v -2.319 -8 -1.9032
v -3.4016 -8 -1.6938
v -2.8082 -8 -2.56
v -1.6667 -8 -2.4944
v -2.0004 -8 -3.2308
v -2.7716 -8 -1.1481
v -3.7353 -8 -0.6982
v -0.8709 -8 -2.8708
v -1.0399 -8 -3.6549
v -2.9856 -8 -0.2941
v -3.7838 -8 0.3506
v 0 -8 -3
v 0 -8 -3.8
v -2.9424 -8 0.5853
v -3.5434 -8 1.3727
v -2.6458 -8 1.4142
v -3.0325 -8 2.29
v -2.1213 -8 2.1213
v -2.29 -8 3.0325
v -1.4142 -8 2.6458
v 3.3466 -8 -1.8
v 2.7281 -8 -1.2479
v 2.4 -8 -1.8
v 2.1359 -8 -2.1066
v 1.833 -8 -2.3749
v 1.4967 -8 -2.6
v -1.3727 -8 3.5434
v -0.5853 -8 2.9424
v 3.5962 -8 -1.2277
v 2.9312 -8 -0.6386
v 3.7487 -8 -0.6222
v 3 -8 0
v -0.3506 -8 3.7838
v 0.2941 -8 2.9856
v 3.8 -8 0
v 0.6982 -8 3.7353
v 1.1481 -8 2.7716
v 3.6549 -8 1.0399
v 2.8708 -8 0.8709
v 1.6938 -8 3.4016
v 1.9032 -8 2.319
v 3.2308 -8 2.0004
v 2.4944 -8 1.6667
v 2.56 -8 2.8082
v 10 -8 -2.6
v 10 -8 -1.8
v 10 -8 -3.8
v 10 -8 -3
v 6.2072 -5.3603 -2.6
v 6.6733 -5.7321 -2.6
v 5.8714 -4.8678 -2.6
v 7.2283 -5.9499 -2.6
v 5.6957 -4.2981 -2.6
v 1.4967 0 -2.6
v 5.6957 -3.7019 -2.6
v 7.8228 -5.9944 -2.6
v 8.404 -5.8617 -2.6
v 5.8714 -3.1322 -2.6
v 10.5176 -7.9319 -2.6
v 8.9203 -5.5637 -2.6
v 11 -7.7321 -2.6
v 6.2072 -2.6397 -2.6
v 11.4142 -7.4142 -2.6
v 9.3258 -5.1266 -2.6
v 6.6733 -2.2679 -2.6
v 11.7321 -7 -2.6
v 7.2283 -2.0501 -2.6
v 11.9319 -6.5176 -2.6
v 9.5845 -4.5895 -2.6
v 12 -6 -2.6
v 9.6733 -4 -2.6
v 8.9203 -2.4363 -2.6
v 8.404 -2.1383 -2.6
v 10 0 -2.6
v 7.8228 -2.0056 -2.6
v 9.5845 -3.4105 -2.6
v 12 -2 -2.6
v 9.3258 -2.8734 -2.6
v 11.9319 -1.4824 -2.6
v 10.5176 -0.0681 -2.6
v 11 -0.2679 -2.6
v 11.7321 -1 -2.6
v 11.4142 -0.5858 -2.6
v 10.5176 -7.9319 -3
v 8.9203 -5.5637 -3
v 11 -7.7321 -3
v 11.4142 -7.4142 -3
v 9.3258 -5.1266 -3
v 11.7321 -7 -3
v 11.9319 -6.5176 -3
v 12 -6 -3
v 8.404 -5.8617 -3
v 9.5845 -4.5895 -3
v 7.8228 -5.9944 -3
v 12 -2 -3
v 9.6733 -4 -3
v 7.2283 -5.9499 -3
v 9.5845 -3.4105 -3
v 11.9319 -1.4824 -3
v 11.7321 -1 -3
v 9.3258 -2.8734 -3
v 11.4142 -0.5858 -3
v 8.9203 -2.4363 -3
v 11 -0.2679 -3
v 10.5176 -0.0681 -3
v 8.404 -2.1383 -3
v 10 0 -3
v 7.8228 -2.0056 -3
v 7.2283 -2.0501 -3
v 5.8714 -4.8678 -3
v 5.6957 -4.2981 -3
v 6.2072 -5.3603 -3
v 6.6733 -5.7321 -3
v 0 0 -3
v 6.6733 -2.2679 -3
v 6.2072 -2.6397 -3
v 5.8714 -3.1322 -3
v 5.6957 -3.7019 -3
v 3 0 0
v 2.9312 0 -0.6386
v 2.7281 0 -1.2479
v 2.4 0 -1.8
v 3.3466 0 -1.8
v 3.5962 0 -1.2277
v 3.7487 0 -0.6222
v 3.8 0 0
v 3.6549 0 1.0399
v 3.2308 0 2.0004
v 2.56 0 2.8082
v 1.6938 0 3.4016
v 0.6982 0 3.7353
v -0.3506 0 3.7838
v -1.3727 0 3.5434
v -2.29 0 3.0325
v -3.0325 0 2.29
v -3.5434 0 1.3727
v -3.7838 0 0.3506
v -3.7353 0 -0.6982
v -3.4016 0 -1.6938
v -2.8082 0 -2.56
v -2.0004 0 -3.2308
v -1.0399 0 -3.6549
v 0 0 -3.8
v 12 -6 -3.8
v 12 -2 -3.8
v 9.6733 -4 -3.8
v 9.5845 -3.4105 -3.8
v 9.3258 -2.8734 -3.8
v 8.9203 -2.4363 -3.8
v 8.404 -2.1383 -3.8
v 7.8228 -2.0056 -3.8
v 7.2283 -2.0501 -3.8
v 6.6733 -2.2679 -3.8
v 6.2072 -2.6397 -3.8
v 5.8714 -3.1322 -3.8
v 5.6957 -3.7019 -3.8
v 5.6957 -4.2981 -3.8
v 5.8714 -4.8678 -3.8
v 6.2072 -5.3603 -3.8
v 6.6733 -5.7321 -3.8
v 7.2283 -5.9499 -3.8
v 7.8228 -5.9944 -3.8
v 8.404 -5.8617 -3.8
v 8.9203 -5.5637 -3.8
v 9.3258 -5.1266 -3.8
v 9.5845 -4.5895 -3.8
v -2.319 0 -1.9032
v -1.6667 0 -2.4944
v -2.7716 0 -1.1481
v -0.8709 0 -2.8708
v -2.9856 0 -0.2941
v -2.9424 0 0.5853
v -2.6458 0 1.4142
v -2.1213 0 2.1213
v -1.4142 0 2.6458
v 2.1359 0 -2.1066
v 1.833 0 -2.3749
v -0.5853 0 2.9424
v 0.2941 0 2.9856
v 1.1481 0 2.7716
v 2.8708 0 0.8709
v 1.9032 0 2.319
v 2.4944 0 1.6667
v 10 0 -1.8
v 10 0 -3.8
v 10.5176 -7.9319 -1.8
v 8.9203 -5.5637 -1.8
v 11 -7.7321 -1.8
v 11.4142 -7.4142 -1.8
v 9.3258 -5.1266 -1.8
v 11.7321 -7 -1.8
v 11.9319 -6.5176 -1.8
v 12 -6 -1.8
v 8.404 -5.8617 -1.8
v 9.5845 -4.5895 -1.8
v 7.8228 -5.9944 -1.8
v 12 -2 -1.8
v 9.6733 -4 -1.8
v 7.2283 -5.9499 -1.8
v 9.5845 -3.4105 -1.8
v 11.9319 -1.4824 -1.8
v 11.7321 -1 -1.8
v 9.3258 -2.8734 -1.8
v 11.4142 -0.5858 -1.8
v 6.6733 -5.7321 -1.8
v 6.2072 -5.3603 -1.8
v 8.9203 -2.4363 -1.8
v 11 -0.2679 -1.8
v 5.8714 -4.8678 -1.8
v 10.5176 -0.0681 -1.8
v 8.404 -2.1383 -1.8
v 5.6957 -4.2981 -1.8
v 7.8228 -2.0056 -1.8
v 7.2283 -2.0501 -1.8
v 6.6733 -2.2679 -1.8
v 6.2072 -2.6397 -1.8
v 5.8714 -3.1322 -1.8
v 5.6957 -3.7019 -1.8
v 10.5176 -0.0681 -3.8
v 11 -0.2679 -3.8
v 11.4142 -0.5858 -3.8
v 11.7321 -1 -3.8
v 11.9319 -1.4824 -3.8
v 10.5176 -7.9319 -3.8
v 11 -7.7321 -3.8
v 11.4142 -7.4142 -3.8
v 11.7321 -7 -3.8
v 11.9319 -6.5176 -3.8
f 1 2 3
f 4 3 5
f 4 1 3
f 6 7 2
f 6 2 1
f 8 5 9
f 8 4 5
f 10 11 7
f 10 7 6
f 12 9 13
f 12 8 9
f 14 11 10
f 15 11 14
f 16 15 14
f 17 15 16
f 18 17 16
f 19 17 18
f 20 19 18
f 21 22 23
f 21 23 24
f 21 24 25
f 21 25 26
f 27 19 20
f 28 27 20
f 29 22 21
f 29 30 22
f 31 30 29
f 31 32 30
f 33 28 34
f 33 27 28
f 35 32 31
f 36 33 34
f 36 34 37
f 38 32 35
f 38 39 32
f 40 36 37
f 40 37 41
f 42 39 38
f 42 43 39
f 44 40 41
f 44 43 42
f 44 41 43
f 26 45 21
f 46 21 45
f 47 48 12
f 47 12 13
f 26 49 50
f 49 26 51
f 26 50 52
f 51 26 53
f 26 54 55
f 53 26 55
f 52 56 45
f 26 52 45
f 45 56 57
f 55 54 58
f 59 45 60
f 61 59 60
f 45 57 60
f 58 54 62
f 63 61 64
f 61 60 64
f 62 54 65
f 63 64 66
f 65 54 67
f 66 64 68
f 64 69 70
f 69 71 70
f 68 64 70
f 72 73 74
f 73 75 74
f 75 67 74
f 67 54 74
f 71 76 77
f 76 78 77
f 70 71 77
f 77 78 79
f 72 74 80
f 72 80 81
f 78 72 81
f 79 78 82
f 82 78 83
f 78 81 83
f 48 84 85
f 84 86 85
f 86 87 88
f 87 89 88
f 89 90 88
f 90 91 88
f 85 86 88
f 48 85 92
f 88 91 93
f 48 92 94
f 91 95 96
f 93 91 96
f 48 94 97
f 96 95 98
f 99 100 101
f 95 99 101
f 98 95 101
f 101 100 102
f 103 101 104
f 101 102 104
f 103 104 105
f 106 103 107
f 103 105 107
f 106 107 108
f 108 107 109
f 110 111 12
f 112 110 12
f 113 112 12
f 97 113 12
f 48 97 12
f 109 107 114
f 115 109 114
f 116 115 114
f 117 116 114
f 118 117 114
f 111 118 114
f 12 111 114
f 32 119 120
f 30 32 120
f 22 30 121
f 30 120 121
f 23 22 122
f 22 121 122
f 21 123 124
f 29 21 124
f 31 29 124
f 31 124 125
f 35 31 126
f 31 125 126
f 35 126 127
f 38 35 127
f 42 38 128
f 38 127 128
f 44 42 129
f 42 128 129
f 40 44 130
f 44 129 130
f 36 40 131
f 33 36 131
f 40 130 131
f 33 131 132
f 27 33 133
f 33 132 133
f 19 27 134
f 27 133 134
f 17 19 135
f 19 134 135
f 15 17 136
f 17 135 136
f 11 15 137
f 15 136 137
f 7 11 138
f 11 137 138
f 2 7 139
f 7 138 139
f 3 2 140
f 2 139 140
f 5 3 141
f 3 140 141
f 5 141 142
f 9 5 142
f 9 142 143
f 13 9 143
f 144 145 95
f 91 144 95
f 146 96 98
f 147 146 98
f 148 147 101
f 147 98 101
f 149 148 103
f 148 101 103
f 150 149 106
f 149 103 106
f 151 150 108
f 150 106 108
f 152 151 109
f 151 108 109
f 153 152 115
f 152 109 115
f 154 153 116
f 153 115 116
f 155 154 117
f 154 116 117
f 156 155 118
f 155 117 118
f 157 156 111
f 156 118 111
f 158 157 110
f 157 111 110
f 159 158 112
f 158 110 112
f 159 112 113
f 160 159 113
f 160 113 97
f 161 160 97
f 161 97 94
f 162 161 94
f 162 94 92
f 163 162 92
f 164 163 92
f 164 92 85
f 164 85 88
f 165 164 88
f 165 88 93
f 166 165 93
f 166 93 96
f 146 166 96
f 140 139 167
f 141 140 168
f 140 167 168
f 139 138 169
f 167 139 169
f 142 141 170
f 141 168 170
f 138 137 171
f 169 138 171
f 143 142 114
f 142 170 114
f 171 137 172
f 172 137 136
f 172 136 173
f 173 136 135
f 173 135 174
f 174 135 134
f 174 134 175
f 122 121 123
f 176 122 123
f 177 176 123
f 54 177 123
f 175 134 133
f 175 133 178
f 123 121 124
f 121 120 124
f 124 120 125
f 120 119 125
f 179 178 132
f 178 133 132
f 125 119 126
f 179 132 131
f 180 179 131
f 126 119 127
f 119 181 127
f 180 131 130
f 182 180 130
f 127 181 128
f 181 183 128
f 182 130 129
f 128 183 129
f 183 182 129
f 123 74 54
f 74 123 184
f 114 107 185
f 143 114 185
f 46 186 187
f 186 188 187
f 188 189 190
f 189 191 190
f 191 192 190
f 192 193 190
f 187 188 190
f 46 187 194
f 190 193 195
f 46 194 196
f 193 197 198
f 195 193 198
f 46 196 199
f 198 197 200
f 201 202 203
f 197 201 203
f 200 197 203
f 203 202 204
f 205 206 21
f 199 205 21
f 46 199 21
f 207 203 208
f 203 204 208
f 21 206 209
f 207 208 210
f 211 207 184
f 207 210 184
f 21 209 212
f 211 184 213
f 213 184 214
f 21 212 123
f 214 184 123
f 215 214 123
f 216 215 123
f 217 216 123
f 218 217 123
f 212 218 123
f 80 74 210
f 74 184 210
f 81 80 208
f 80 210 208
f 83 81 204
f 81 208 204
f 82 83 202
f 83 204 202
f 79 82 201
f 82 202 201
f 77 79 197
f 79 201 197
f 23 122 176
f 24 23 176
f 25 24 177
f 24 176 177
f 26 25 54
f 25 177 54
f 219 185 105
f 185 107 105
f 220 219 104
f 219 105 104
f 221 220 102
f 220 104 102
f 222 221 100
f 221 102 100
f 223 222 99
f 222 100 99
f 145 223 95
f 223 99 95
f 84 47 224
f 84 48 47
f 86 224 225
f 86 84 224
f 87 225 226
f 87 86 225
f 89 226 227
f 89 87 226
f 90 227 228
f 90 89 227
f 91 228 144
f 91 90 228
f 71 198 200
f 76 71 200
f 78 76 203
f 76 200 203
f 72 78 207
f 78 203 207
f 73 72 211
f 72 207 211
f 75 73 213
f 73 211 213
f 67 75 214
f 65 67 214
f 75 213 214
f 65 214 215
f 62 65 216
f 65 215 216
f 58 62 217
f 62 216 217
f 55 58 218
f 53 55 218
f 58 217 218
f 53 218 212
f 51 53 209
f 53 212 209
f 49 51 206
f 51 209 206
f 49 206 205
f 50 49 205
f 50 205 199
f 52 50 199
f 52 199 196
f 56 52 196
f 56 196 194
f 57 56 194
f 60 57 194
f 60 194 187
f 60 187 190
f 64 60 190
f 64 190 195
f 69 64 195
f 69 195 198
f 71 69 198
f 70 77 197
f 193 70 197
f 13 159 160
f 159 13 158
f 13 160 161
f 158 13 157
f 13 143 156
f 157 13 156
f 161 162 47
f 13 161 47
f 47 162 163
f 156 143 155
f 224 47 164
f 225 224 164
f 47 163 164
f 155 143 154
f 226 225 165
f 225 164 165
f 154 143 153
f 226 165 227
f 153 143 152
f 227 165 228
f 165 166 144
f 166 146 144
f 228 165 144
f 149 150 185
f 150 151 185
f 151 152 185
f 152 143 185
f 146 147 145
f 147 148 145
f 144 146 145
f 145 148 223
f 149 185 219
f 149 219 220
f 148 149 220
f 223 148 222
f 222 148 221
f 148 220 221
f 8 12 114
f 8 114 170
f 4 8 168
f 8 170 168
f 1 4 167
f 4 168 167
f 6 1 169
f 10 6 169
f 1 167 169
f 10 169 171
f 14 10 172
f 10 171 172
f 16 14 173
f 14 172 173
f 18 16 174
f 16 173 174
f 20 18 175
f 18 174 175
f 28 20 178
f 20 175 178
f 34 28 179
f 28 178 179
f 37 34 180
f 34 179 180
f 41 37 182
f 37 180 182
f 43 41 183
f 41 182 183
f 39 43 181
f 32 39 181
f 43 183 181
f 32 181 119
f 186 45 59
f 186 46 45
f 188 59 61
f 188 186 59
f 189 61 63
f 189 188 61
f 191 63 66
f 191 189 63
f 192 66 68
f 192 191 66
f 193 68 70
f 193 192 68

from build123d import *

# Parameters (mm, degrees)
F1_DEPTH = 8
F2_R     = 2
F3_DEPTH = 25
F4_R     = 2


# Not quite as in the source:
# - a feature names something its author has since deleted; it is built from what else it names


with BuildPart() as f1:
    # F0 (on Front) → F1 (new body)
    with BuildSketch(Plane.XZ):
        with BuildLine():
            ThreePointArc((0, -3), (-2.1213203436, 2.1213203436), (3, 0))
            ThreePointArc((3, 0), (2.8460498942, -0.9486832981), (2.4, -1.8))
            Line((2.4, -1.8), (3.3466401061, -1.8))
            ThreePointArc((3.3466401061, -1.8), (3.6849173941, -0.9281076437), (3.8, 0))
            ThreePointArc((3.8, 0), (-2.6870057685, 2.6870057685), (0, -3.8))
            Line((0, -3.8), (0, -3))
        make_face()
        with BuildLine():
            Line((2.3323807579, -3), (0, -3))
            Line((0, -3), (0, -3.8))
            ThreePointArc((0, -3.8), (1.2328828006, -3.5944401511), (2.3323807579, -3))
        make_face()
        with BuildLine():
            Line((3.3466401061, -1.8), (2.4, -1.8))
            ThreePointArc((2.4, -1.8), (1.9889684627, -2.2458861178), (1.4966629547, -2.6))
            Line((1.4966629547, -2.6), (2.7712812921, -2.6))
            ThreePointArc((2.7712812921, -2.6), (3.0850025217, -2.2187292402), (3.3466401061, -1.8))
        make_face()
        with BuildLine():
            Line((12, -3), (2.3323807579, -3))
            ThreePointArc((2.3323807579, -3), (1.2328828006, -3.5944401511), (0, -3.8))
            Line((0, -3.8), (12, -3.8))
            Line((12, -3.8), (12, -3))
        make_face()
        with BuildLine():
            Line((12, -1.8), (3.3466401061, -1.8))
            ThreePointArc((3.3466401061, -1.8), (3.0850025217, -2.2187292402), (2.7712812921, -2.6))
            Line((2.7712812921, -2.6), (12, -2.6))
            Line((12, -2.6), (12, -1.8))
        make_face()
    extrude(amount=F1_DEPTH)

    # F2 (on face) → F3 (cut)
    with BuildSketch(Plane.XY.offset(-1.8)):
        with Locations((7.6733200531, -4)):
            Circle(F2_R)
    extrude(amount=-F3_DEPTH, mode=Mode.SUBTRACT)

    # F4
    f4_edges = [f1.edges().sort_by_distance(p)[0] for p in [
        (12, -8, -2.2),
        (12, -8, -3.4),
        (12, 0, -3.4),
        (12, 0, -2.2),
    ]]
    fillet(f4_edges, radius=F4_R)


solid = f1.part
